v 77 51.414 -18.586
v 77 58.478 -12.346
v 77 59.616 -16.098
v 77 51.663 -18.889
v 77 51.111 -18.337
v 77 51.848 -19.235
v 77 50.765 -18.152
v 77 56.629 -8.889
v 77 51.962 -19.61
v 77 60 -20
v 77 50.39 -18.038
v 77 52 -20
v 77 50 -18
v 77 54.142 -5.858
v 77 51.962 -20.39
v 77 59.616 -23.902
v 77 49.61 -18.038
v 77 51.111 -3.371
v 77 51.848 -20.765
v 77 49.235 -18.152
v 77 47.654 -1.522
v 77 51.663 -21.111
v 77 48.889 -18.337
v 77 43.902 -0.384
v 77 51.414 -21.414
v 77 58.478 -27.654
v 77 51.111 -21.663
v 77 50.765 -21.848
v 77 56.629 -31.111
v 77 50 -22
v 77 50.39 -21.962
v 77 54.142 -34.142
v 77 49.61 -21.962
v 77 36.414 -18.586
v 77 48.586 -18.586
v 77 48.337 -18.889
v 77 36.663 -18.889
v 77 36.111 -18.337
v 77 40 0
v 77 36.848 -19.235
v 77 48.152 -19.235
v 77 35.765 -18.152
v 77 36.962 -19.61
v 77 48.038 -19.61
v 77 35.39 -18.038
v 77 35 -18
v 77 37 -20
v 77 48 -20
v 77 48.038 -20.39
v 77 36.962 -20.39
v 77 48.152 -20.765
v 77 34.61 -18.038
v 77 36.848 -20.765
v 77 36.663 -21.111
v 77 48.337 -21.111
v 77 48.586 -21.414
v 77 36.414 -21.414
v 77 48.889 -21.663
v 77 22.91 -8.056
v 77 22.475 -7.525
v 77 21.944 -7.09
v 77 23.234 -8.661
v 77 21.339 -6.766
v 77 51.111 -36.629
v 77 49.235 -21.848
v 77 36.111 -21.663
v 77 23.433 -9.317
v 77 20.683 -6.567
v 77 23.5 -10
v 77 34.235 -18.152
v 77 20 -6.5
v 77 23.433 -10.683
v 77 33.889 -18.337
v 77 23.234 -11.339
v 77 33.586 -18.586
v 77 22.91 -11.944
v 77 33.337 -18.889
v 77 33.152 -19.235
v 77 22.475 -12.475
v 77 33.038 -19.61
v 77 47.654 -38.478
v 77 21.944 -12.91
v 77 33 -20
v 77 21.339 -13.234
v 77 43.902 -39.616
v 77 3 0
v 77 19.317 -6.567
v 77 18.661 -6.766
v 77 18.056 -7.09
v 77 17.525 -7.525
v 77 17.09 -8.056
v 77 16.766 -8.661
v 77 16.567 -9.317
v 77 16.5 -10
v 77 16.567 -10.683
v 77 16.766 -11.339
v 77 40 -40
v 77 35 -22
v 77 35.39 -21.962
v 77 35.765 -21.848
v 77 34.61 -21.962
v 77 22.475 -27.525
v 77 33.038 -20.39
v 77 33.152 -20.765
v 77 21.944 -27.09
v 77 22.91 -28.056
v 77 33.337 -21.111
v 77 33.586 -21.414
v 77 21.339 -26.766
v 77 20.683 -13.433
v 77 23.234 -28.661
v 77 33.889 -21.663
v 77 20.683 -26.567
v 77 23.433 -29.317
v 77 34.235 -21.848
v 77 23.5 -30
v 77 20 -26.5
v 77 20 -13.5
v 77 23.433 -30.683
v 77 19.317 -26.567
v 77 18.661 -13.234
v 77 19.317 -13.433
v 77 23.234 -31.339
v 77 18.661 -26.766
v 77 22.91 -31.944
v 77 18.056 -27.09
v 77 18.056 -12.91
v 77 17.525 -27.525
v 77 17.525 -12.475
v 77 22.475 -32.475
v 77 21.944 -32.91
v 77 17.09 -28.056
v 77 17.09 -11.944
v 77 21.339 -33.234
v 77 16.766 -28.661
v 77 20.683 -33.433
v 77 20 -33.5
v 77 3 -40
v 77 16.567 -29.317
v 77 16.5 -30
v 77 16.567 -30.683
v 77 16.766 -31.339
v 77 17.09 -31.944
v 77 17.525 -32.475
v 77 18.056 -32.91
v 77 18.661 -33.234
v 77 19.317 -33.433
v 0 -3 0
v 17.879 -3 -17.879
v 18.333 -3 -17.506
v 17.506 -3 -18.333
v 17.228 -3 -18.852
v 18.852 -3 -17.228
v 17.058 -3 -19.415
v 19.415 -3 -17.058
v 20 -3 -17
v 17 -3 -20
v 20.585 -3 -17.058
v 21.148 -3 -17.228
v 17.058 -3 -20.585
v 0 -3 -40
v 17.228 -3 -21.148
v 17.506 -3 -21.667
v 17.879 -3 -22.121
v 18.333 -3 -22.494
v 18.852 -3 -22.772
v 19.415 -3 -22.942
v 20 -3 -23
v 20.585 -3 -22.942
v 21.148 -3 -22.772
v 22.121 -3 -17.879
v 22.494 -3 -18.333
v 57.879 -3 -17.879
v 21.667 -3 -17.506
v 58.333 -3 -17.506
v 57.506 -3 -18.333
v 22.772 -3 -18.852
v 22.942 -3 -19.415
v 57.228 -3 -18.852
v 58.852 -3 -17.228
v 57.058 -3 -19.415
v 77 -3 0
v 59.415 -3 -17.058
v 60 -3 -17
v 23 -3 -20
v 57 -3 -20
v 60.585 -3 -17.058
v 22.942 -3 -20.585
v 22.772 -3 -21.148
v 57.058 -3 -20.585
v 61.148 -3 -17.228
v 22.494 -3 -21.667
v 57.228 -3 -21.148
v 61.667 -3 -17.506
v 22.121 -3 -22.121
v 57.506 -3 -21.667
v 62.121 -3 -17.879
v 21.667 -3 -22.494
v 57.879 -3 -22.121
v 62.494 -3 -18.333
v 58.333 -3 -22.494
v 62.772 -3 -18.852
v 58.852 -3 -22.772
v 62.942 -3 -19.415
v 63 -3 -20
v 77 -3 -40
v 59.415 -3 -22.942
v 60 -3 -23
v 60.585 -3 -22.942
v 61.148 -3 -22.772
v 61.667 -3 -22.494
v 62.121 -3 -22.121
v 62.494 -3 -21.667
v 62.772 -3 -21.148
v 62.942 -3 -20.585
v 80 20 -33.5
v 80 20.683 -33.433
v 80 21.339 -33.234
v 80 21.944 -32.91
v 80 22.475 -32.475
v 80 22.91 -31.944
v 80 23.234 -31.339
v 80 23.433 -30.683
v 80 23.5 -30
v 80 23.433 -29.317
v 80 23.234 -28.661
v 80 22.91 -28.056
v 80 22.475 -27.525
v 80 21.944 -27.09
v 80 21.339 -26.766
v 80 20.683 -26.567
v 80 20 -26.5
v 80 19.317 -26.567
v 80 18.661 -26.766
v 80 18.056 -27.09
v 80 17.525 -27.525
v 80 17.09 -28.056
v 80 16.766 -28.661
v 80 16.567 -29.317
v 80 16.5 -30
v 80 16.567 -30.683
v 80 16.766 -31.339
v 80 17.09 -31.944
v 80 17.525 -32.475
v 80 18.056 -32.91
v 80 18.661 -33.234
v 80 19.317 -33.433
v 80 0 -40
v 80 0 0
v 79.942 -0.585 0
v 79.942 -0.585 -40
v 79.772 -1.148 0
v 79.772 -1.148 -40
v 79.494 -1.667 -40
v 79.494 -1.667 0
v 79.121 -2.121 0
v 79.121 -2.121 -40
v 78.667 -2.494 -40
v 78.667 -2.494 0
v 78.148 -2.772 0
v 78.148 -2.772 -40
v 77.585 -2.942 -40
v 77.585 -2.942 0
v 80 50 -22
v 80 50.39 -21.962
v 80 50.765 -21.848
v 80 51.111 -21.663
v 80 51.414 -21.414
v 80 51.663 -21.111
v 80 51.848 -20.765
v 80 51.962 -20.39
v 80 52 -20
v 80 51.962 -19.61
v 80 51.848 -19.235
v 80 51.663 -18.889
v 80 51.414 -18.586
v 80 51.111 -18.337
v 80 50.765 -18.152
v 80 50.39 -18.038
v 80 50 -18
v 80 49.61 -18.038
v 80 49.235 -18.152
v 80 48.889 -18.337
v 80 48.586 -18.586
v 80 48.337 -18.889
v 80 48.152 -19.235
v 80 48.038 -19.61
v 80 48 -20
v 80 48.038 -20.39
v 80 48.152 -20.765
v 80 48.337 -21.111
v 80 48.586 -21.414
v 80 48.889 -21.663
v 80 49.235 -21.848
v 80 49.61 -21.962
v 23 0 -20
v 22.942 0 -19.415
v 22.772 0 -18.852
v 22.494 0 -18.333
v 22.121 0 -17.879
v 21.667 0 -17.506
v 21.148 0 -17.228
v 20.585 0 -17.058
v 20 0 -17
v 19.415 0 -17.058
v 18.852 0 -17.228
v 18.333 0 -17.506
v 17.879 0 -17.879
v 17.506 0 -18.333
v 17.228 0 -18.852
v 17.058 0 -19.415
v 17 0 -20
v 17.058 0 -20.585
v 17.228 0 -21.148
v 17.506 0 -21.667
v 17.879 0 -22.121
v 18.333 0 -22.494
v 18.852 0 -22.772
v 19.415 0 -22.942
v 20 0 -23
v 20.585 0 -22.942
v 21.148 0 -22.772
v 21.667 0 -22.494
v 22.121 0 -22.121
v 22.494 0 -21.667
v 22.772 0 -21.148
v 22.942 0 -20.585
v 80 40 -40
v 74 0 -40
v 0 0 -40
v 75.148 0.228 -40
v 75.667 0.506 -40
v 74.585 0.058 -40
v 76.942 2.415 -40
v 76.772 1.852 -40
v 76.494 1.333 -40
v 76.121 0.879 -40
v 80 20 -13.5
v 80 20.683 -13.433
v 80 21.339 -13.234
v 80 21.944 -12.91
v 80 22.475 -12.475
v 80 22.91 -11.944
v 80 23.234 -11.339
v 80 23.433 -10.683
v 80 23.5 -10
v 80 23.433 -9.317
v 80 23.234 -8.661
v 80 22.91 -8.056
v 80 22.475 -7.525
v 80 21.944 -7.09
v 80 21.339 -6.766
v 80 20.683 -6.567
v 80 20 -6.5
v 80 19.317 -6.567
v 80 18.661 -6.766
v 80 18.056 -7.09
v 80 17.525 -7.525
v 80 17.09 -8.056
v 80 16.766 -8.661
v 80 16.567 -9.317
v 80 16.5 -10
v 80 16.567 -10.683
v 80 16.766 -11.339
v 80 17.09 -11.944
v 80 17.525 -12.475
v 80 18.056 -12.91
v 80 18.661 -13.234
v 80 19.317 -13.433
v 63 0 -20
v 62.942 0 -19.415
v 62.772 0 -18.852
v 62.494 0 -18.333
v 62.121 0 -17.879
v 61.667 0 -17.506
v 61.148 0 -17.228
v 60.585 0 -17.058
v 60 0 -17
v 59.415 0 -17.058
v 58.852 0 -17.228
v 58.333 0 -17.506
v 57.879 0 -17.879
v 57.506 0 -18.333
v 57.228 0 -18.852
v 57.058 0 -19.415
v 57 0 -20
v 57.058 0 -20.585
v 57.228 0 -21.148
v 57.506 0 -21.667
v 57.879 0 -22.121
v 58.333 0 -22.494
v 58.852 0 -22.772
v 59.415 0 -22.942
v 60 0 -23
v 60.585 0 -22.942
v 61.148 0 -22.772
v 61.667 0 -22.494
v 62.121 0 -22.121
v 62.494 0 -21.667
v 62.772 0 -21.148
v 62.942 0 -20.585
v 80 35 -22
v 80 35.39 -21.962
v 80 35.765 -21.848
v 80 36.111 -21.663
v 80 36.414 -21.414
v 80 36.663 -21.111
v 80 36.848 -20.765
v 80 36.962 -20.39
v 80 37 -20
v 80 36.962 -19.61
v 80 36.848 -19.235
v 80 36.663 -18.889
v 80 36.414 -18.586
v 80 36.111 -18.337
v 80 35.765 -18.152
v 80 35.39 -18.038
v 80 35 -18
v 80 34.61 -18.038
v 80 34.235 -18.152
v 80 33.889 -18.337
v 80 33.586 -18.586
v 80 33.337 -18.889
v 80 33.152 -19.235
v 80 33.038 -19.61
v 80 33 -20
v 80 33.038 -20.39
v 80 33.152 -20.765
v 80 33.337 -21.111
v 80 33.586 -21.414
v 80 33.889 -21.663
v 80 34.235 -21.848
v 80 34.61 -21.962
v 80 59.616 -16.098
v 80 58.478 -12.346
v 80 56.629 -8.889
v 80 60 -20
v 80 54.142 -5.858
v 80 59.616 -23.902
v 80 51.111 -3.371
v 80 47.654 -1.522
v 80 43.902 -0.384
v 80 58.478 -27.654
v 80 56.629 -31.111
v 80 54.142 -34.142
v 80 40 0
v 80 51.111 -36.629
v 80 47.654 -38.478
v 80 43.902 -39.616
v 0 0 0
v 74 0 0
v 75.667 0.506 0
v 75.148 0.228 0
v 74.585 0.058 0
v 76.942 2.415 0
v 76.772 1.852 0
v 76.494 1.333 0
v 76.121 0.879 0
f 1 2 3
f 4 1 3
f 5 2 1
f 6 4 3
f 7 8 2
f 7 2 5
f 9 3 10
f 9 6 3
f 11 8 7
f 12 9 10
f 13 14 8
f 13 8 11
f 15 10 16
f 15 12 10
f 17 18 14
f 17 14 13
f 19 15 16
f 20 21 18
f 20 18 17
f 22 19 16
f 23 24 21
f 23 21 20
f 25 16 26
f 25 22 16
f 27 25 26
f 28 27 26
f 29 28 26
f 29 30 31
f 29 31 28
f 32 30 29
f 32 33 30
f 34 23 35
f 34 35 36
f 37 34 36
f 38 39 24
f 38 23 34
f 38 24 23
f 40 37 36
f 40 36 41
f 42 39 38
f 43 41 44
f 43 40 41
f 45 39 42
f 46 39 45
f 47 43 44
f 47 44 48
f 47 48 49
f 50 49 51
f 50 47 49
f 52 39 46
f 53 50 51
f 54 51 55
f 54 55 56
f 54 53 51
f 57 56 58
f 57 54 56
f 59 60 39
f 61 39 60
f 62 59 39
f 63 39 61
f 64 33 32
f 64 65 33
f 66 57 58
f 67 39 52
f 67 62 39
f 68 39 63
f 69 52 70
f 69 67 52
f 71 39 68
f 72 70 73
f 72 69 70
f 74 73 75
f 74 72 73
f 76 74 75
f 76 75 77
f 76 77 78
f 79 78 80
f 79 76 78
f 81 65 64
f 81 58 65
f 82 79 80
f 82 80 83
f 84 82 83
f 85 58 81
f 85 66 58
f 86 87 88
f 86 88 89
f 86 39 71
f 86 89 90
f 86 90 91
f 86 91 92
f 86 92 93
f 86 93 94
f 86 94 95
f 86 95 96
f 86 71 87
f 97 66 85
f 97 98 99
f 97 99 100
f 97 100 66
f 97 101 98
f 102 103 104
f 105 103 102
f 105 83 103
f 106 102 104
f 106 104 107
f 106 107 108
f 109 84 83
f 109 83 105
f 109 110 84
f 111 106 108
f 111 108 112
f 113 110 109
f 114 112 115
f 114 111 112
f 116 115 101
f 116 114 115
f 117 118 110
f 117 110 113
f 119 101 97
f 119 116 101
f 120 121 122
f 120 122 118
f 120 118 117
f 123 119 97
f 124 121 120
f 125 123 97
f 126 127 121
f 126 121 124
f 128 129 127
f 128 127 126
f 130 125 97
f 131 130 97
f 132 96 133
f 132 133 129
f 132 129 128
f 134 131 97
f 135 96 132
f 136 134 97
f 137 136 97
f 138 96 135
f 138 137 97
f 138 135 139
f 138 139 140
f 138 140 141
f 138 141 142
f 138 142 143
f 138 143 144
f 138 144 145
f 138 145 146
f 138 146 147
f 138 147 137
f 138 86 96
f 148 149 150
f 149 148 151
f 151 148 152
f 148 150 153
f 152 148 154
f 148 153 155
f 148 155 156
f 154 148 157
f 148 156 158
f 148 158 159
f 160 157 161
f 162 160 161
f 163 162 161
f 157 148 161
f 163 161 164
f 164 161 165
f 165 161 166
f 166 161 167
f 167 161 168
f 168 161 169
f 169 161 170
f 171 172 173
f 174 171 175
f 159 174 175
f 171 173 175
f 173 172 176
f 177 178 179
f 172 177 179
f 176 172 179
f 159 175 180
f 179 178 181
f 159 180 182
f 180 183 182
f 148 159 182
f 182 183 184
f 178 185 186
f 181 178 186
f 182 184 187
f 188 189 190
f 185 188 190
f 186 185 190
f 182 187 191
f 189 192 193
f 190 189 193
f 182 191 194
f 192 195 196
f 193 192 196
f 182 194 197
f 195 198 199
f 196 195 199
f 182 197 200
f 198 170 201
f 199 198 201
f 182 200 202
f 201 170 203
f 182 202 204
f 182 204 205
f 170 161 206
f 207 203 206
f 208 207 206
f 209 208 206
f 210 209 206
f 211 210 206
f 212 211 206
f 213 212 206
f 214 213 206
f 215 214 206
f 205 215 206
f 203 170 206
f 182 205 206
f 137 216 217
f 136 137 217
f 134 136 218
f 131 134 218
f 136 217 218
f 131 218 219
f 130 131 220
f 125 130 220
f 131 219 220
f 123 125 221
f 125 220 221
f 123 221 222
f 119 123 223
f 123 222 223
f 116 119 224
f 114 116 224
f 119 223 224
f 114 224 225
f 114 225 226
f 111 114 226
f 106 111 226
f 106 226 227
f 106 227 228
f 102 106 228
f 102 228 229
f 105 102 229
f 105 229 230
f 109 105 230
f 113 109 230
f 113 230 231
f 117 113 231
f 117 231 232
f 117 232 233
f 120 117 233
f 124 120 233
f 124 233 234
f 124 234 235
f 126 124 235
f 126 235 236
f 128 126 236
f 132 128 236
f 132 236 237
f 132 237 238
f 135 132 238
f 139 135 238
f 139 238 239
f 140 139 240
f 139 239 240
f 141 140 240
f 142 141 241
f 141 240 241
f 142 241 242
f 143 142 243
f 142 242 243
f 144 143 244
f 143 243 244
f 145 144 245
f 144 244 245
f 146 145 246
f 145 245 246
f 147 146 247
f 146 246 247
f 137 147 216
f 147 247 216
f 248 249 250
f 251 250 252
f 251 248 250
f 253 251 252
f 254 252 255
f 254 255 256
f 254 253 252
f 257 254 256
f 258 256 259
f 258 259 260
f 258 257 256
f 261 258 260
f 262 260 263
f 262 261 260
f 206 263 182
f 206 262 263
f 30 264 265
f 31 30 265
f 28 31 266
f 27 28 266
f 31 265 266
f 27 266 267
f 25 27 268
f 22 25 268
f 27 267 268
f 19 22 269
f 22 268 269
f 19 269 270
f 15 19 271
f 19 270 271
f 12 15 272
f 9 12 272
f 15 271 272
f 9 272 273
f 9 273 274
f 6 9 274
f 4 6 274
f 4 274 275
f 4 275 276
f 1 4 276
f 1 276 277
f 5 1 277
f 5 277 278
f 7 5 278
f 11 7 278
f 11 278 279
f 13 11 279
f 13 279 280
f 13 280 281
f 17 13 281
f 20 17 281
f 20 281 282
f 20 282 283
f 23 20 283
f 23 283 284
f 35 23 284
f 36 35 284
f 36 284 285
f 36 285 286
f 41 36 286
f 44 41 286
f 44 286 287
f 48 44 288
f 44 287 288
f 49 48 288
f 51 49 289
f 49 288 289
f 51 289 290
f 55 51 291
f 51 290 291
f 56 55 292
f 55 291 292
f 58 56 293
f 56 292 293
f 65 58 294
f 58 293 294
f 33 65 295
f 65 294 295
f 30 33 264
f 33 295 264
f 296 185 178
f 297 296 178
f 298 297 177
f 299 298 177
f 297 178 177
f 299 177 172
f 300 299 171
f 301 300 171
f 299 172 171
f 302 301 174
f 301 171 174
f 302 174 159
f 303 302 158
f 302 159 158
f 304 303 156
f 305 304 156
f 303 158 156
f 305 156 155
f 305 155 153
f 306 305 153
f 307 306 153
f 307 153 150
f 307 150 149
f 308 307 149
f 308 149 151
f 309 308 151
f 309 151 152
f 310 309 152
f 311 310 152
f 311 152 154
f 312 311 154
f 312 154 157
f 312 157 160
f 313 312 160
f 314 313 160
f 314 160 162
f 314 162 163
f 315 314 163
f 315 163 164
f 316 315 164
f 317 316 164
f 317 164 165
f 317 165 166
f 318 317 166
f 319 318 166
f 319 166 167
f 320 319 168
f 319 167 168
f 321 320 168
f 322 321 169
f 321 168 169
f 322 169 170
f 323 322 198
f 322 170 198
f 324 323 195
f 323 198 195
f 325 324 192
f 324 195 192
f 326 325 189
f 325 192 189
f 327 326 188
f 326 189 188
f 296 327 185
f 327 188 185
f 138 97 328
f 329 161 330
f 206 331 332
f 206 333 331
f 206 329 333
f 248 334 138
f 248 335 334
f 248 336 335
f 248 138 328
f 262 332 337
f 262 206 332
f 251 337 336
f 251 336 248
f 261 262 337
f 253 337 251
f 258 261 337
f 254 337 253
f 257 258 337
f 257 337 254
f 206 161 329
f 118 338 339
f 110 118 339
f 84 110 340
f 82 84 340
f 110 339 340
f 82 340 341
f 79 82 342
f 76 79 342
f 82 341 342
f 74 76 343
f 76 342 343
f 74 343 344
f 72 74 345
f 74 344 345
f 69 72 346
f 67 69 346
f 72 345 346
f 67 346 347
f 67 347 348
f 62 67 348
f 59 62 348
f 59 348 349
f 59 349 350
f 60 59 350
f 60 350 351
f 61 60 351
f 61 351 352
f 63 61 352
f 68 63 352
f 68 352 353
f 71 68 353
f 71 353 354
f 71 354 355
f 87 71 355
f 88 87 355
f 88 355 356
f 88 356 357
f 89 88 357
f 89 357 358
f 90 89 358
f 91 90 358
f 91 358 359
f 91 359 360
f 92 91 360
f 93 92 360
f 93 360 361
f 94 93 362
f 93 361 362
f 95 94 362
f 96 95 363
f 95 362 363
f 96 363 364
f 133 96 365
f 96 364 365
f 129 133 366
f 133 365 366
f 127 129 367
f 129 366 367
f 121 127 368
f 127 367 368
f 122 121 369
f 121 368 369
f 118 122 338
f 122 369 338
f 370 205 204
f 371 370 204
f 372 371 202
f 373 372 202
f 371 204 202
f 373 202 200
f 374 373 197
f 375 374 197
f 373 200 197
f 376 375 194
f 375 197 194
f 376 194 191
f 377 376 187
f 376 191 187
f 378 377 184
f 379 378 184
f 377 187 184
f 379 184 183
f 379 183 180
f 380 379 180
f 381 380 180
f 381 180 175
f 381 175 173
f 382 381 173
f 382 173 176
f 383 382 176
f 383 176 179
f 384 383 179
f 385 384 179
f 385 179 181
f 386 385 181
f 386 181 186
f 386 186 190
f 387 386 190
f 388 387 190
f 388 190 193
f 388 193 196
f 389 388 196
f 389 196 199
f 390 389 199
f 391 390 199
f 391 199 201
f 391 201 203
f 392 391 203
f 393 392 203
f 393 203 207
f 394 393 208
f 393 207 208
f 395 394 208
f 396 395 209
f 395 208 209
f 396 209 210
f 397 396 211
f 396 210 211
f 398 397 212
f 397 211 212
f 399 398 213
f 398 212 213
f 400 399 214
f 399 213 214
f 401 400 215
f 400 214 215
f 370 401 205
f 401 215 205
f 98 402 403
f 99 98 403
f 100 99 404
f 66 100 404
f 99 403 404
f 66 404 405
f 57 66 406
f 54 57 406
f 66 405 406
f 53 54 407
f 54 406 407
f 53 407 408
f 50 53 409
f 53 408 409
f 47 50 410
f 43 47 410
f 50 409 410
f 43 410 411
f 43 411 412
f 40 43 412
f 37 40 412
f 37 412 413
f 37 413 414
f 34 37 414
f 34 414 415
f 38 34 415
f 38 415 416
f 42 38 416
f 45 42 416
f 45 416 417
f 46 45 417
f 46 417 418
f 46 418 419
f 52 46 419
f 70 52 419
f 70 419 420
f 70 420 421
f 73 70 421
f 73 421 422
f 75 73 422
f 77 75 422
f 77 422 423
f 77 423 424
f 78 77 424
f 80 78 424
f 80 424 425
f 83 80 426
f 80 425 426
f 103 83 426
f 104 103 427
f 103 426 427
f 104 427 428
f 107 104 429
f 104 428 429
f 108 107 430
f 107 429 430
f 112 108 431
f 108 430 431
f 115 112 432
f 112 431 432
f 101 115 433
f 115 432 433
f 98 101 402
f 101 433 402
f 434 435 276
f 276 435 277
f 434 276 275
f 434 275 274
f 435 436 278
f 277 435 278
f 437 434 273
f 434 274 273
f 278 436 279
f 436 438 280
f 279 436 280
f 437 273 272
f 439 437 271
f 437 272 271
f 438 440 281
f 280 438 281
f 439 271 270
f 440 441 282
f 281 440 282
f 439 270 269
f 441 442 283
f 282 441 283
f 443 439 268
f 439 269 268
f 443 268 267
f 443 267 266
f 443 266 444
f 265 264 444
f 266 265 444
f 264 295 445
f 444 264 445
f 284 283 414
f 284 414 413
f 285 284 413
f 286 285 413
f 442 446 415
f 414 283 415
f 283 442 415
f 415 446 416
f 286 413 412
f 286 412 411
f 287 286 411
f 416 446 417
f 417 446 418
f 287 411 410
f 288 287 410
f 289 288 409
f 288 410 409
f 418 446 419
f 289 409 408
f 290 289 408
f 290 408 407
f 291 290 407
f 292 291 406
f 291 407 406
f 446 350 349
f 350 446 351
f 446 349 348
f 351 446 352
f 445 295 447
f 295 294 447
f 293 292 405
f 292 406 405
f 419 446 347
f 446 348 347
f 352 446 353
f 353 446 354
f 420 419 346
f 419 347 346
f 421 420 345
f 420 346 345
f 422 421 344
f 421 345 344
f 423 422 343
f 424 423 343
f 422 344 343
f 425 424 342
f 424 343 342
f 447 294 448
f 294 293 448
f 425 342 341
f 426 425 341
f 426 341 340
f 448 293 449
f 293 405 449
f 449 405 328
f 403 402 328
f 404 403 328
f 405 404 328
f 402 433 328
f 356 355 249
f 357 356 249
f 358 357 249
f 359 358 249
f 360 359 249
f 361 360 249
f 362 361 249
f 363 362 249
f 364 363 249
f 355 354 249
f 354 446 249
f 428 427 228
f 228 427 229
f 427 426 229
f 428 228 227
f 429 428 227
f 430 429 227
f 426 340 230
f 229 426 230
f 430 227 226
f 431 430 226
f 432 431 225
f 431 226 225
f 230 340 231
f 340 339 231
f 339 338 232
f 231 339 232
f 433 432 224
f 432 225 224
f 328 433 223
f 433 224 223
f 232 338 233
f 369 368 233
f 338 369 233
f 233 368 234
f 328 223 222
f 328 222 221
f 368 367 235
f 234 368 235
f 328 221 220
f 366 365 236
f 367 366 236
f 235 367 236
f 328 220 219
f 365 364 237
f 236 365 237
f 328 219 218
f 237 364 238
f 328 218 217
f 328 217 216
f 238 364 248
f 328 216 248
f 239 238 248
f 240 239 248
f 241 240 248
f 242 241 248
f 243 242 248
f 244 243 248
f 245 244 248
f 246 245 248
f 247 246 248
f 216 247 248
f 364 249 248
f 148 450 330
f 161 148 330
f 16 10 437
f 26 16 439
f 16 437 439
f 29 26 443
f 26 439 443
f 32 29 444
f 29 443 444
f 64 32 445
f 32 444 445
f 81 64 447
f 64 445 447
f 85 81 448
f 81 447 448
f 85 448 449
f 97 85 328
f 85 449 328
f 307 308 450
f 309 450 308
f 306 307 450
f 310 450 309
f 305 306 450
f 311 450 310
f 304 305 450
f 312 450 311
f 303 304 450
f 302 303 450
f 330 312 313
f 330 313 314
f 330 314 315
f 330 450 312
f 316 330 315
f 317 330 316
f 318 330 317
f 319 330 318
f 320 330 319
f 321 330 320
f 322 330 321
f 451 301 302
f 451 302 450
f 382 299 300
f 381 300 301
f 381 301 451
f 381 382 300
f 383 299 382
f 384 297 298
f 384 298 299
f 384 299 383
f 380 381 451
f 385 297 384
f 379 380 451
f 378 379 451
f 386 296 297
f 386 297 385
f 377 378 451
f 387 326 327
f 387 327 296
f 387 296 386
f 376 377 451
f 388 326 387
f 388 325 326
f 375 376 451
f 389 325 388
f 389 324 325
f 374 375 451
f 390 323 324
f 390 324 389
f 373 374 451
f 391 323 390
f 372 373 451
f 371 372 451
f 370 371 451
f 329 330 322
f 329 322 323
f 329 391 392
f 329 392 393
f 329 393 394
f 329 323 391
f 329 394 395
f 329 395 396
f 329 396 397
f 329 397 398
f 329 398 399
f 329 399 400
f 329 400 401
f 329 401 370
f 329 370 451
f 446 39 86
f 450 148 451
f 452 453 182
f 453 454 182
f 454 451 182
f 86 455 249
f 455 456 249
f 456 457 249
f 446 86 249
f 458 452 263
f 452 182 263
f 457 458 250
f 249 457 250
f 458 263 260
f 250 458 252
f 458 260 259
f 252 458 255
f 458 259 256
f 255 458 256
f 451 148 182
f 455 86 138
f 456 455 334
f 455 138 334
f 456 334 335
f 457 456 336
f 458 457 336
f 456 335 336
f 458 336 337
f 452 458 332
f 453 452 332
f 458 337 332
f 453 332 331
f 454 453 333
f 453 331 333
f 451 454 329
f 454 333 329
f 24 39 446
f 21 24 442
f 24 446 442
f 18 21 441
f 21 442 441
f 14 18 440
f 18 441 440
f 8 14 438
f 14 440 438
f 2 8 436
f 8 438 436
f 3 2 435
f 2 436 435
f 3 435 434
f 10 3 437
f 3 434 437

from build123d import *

# Parameters (mm, degrees)
SKETCH2_W           = 80
SKETCH2_H           = 40
BOSS_EXTRUDE1_DEPTH = 3
SKETCH2_3_W         = 3
SKETCH2_3_H         = 40
BOSS_EXTRUDE2_DEPTH = 60
FILLET1_R           = 3
SKETCH3_R           = 2
SKETCH3_R_2         = 3.5
CUT_EXTRUDE1_DEPTH  = 108.703296143
SKETCH7_R           = 3
CUT_EXTRUDE2_DEPTH  = 110.402925007


with BuildPart() as part:
    # Sketch2 → Boss-Extrude1 (new body)
    with BuildSketch(Plane(origin=(0, 0, 0), x_dir=(1, 0, 0), z_dir=(0, 1, 0))):
        with Locations((40, 20)):
            Rectangle(SKETCH2_W, SKETCH2_H)
    extrude(amount=-BOSS_EXTRUDE1_DEPTH)

    # Sketch2<3> → Boss-Extrude2 (add)
    with BuildSketch(Plane(origin=(0, 0, 0), x_dir=(1, 0, 0), z_dir=(0, 1, 0))):
        with Locations((78.5, 20)):
            Rectangle(SKETCH2_3_W, SKETCH2_3_H)
    extrude(amount=BOSS_EXTRUDE2_DEPTH)

    # Fillet1
    fillet1_edges = [part.edges().sort_by_distance(p)[0] for p in [
        (80, -3, -20),
        (77, 0, -20),
    ]]
    fillet(fillet1_edges, radius=FILLET1_R)

    # Sketch3 → Cut-Extrude1 (cut, through all)
    with BuildSketch(Plane(origin=(80, 0, 0), x_dir=(0, 0, -1), z_dir=(1, 0, 0))):
        with Locations((20, 35)):
            Circle(SKETCH3_R)
        with Locations((20, 50)):
            Circle(SKETCH3_R)
        with BuildLine():
            ThreePointArc((0, 40), (5.857864376, 54.142135624), (20, 60))
            Line((20, 60), (0, 60))
            Line((0, 60), (0, 40))
        make_face()
        with BuildLine():
            Line((40, 60), (20, 60))
            ThreePointArc((20, 60), (34.142135624, 54.142135624), (40, 40))
            Line((40, 40), (40, 60))
        make_face()
        with Locations((10, 20)):
            Circle(SKETCH3_R_2)
        with Locations((30, 20)):
            Circle(SKETCH3_R_2)
    extrude(amount=-CUT_EXTRUDE1_DEPTH, mode=Mode.SUBTRACT)

    # Sketch7 → Cut-Extrude2 (cut, through all)
    with BuildSketch(Plane.XZ.offset(3)):
        with Locations((60, -20)):
            Circle(SKETCH7_R)
        with Locations((20, -20)):
            Circle(SKETCH7_R)
    extrude(amount=-CUT_EXTRUDE2_DEPTH, mode=Mode.SUBTRACT)


solid = part.part
